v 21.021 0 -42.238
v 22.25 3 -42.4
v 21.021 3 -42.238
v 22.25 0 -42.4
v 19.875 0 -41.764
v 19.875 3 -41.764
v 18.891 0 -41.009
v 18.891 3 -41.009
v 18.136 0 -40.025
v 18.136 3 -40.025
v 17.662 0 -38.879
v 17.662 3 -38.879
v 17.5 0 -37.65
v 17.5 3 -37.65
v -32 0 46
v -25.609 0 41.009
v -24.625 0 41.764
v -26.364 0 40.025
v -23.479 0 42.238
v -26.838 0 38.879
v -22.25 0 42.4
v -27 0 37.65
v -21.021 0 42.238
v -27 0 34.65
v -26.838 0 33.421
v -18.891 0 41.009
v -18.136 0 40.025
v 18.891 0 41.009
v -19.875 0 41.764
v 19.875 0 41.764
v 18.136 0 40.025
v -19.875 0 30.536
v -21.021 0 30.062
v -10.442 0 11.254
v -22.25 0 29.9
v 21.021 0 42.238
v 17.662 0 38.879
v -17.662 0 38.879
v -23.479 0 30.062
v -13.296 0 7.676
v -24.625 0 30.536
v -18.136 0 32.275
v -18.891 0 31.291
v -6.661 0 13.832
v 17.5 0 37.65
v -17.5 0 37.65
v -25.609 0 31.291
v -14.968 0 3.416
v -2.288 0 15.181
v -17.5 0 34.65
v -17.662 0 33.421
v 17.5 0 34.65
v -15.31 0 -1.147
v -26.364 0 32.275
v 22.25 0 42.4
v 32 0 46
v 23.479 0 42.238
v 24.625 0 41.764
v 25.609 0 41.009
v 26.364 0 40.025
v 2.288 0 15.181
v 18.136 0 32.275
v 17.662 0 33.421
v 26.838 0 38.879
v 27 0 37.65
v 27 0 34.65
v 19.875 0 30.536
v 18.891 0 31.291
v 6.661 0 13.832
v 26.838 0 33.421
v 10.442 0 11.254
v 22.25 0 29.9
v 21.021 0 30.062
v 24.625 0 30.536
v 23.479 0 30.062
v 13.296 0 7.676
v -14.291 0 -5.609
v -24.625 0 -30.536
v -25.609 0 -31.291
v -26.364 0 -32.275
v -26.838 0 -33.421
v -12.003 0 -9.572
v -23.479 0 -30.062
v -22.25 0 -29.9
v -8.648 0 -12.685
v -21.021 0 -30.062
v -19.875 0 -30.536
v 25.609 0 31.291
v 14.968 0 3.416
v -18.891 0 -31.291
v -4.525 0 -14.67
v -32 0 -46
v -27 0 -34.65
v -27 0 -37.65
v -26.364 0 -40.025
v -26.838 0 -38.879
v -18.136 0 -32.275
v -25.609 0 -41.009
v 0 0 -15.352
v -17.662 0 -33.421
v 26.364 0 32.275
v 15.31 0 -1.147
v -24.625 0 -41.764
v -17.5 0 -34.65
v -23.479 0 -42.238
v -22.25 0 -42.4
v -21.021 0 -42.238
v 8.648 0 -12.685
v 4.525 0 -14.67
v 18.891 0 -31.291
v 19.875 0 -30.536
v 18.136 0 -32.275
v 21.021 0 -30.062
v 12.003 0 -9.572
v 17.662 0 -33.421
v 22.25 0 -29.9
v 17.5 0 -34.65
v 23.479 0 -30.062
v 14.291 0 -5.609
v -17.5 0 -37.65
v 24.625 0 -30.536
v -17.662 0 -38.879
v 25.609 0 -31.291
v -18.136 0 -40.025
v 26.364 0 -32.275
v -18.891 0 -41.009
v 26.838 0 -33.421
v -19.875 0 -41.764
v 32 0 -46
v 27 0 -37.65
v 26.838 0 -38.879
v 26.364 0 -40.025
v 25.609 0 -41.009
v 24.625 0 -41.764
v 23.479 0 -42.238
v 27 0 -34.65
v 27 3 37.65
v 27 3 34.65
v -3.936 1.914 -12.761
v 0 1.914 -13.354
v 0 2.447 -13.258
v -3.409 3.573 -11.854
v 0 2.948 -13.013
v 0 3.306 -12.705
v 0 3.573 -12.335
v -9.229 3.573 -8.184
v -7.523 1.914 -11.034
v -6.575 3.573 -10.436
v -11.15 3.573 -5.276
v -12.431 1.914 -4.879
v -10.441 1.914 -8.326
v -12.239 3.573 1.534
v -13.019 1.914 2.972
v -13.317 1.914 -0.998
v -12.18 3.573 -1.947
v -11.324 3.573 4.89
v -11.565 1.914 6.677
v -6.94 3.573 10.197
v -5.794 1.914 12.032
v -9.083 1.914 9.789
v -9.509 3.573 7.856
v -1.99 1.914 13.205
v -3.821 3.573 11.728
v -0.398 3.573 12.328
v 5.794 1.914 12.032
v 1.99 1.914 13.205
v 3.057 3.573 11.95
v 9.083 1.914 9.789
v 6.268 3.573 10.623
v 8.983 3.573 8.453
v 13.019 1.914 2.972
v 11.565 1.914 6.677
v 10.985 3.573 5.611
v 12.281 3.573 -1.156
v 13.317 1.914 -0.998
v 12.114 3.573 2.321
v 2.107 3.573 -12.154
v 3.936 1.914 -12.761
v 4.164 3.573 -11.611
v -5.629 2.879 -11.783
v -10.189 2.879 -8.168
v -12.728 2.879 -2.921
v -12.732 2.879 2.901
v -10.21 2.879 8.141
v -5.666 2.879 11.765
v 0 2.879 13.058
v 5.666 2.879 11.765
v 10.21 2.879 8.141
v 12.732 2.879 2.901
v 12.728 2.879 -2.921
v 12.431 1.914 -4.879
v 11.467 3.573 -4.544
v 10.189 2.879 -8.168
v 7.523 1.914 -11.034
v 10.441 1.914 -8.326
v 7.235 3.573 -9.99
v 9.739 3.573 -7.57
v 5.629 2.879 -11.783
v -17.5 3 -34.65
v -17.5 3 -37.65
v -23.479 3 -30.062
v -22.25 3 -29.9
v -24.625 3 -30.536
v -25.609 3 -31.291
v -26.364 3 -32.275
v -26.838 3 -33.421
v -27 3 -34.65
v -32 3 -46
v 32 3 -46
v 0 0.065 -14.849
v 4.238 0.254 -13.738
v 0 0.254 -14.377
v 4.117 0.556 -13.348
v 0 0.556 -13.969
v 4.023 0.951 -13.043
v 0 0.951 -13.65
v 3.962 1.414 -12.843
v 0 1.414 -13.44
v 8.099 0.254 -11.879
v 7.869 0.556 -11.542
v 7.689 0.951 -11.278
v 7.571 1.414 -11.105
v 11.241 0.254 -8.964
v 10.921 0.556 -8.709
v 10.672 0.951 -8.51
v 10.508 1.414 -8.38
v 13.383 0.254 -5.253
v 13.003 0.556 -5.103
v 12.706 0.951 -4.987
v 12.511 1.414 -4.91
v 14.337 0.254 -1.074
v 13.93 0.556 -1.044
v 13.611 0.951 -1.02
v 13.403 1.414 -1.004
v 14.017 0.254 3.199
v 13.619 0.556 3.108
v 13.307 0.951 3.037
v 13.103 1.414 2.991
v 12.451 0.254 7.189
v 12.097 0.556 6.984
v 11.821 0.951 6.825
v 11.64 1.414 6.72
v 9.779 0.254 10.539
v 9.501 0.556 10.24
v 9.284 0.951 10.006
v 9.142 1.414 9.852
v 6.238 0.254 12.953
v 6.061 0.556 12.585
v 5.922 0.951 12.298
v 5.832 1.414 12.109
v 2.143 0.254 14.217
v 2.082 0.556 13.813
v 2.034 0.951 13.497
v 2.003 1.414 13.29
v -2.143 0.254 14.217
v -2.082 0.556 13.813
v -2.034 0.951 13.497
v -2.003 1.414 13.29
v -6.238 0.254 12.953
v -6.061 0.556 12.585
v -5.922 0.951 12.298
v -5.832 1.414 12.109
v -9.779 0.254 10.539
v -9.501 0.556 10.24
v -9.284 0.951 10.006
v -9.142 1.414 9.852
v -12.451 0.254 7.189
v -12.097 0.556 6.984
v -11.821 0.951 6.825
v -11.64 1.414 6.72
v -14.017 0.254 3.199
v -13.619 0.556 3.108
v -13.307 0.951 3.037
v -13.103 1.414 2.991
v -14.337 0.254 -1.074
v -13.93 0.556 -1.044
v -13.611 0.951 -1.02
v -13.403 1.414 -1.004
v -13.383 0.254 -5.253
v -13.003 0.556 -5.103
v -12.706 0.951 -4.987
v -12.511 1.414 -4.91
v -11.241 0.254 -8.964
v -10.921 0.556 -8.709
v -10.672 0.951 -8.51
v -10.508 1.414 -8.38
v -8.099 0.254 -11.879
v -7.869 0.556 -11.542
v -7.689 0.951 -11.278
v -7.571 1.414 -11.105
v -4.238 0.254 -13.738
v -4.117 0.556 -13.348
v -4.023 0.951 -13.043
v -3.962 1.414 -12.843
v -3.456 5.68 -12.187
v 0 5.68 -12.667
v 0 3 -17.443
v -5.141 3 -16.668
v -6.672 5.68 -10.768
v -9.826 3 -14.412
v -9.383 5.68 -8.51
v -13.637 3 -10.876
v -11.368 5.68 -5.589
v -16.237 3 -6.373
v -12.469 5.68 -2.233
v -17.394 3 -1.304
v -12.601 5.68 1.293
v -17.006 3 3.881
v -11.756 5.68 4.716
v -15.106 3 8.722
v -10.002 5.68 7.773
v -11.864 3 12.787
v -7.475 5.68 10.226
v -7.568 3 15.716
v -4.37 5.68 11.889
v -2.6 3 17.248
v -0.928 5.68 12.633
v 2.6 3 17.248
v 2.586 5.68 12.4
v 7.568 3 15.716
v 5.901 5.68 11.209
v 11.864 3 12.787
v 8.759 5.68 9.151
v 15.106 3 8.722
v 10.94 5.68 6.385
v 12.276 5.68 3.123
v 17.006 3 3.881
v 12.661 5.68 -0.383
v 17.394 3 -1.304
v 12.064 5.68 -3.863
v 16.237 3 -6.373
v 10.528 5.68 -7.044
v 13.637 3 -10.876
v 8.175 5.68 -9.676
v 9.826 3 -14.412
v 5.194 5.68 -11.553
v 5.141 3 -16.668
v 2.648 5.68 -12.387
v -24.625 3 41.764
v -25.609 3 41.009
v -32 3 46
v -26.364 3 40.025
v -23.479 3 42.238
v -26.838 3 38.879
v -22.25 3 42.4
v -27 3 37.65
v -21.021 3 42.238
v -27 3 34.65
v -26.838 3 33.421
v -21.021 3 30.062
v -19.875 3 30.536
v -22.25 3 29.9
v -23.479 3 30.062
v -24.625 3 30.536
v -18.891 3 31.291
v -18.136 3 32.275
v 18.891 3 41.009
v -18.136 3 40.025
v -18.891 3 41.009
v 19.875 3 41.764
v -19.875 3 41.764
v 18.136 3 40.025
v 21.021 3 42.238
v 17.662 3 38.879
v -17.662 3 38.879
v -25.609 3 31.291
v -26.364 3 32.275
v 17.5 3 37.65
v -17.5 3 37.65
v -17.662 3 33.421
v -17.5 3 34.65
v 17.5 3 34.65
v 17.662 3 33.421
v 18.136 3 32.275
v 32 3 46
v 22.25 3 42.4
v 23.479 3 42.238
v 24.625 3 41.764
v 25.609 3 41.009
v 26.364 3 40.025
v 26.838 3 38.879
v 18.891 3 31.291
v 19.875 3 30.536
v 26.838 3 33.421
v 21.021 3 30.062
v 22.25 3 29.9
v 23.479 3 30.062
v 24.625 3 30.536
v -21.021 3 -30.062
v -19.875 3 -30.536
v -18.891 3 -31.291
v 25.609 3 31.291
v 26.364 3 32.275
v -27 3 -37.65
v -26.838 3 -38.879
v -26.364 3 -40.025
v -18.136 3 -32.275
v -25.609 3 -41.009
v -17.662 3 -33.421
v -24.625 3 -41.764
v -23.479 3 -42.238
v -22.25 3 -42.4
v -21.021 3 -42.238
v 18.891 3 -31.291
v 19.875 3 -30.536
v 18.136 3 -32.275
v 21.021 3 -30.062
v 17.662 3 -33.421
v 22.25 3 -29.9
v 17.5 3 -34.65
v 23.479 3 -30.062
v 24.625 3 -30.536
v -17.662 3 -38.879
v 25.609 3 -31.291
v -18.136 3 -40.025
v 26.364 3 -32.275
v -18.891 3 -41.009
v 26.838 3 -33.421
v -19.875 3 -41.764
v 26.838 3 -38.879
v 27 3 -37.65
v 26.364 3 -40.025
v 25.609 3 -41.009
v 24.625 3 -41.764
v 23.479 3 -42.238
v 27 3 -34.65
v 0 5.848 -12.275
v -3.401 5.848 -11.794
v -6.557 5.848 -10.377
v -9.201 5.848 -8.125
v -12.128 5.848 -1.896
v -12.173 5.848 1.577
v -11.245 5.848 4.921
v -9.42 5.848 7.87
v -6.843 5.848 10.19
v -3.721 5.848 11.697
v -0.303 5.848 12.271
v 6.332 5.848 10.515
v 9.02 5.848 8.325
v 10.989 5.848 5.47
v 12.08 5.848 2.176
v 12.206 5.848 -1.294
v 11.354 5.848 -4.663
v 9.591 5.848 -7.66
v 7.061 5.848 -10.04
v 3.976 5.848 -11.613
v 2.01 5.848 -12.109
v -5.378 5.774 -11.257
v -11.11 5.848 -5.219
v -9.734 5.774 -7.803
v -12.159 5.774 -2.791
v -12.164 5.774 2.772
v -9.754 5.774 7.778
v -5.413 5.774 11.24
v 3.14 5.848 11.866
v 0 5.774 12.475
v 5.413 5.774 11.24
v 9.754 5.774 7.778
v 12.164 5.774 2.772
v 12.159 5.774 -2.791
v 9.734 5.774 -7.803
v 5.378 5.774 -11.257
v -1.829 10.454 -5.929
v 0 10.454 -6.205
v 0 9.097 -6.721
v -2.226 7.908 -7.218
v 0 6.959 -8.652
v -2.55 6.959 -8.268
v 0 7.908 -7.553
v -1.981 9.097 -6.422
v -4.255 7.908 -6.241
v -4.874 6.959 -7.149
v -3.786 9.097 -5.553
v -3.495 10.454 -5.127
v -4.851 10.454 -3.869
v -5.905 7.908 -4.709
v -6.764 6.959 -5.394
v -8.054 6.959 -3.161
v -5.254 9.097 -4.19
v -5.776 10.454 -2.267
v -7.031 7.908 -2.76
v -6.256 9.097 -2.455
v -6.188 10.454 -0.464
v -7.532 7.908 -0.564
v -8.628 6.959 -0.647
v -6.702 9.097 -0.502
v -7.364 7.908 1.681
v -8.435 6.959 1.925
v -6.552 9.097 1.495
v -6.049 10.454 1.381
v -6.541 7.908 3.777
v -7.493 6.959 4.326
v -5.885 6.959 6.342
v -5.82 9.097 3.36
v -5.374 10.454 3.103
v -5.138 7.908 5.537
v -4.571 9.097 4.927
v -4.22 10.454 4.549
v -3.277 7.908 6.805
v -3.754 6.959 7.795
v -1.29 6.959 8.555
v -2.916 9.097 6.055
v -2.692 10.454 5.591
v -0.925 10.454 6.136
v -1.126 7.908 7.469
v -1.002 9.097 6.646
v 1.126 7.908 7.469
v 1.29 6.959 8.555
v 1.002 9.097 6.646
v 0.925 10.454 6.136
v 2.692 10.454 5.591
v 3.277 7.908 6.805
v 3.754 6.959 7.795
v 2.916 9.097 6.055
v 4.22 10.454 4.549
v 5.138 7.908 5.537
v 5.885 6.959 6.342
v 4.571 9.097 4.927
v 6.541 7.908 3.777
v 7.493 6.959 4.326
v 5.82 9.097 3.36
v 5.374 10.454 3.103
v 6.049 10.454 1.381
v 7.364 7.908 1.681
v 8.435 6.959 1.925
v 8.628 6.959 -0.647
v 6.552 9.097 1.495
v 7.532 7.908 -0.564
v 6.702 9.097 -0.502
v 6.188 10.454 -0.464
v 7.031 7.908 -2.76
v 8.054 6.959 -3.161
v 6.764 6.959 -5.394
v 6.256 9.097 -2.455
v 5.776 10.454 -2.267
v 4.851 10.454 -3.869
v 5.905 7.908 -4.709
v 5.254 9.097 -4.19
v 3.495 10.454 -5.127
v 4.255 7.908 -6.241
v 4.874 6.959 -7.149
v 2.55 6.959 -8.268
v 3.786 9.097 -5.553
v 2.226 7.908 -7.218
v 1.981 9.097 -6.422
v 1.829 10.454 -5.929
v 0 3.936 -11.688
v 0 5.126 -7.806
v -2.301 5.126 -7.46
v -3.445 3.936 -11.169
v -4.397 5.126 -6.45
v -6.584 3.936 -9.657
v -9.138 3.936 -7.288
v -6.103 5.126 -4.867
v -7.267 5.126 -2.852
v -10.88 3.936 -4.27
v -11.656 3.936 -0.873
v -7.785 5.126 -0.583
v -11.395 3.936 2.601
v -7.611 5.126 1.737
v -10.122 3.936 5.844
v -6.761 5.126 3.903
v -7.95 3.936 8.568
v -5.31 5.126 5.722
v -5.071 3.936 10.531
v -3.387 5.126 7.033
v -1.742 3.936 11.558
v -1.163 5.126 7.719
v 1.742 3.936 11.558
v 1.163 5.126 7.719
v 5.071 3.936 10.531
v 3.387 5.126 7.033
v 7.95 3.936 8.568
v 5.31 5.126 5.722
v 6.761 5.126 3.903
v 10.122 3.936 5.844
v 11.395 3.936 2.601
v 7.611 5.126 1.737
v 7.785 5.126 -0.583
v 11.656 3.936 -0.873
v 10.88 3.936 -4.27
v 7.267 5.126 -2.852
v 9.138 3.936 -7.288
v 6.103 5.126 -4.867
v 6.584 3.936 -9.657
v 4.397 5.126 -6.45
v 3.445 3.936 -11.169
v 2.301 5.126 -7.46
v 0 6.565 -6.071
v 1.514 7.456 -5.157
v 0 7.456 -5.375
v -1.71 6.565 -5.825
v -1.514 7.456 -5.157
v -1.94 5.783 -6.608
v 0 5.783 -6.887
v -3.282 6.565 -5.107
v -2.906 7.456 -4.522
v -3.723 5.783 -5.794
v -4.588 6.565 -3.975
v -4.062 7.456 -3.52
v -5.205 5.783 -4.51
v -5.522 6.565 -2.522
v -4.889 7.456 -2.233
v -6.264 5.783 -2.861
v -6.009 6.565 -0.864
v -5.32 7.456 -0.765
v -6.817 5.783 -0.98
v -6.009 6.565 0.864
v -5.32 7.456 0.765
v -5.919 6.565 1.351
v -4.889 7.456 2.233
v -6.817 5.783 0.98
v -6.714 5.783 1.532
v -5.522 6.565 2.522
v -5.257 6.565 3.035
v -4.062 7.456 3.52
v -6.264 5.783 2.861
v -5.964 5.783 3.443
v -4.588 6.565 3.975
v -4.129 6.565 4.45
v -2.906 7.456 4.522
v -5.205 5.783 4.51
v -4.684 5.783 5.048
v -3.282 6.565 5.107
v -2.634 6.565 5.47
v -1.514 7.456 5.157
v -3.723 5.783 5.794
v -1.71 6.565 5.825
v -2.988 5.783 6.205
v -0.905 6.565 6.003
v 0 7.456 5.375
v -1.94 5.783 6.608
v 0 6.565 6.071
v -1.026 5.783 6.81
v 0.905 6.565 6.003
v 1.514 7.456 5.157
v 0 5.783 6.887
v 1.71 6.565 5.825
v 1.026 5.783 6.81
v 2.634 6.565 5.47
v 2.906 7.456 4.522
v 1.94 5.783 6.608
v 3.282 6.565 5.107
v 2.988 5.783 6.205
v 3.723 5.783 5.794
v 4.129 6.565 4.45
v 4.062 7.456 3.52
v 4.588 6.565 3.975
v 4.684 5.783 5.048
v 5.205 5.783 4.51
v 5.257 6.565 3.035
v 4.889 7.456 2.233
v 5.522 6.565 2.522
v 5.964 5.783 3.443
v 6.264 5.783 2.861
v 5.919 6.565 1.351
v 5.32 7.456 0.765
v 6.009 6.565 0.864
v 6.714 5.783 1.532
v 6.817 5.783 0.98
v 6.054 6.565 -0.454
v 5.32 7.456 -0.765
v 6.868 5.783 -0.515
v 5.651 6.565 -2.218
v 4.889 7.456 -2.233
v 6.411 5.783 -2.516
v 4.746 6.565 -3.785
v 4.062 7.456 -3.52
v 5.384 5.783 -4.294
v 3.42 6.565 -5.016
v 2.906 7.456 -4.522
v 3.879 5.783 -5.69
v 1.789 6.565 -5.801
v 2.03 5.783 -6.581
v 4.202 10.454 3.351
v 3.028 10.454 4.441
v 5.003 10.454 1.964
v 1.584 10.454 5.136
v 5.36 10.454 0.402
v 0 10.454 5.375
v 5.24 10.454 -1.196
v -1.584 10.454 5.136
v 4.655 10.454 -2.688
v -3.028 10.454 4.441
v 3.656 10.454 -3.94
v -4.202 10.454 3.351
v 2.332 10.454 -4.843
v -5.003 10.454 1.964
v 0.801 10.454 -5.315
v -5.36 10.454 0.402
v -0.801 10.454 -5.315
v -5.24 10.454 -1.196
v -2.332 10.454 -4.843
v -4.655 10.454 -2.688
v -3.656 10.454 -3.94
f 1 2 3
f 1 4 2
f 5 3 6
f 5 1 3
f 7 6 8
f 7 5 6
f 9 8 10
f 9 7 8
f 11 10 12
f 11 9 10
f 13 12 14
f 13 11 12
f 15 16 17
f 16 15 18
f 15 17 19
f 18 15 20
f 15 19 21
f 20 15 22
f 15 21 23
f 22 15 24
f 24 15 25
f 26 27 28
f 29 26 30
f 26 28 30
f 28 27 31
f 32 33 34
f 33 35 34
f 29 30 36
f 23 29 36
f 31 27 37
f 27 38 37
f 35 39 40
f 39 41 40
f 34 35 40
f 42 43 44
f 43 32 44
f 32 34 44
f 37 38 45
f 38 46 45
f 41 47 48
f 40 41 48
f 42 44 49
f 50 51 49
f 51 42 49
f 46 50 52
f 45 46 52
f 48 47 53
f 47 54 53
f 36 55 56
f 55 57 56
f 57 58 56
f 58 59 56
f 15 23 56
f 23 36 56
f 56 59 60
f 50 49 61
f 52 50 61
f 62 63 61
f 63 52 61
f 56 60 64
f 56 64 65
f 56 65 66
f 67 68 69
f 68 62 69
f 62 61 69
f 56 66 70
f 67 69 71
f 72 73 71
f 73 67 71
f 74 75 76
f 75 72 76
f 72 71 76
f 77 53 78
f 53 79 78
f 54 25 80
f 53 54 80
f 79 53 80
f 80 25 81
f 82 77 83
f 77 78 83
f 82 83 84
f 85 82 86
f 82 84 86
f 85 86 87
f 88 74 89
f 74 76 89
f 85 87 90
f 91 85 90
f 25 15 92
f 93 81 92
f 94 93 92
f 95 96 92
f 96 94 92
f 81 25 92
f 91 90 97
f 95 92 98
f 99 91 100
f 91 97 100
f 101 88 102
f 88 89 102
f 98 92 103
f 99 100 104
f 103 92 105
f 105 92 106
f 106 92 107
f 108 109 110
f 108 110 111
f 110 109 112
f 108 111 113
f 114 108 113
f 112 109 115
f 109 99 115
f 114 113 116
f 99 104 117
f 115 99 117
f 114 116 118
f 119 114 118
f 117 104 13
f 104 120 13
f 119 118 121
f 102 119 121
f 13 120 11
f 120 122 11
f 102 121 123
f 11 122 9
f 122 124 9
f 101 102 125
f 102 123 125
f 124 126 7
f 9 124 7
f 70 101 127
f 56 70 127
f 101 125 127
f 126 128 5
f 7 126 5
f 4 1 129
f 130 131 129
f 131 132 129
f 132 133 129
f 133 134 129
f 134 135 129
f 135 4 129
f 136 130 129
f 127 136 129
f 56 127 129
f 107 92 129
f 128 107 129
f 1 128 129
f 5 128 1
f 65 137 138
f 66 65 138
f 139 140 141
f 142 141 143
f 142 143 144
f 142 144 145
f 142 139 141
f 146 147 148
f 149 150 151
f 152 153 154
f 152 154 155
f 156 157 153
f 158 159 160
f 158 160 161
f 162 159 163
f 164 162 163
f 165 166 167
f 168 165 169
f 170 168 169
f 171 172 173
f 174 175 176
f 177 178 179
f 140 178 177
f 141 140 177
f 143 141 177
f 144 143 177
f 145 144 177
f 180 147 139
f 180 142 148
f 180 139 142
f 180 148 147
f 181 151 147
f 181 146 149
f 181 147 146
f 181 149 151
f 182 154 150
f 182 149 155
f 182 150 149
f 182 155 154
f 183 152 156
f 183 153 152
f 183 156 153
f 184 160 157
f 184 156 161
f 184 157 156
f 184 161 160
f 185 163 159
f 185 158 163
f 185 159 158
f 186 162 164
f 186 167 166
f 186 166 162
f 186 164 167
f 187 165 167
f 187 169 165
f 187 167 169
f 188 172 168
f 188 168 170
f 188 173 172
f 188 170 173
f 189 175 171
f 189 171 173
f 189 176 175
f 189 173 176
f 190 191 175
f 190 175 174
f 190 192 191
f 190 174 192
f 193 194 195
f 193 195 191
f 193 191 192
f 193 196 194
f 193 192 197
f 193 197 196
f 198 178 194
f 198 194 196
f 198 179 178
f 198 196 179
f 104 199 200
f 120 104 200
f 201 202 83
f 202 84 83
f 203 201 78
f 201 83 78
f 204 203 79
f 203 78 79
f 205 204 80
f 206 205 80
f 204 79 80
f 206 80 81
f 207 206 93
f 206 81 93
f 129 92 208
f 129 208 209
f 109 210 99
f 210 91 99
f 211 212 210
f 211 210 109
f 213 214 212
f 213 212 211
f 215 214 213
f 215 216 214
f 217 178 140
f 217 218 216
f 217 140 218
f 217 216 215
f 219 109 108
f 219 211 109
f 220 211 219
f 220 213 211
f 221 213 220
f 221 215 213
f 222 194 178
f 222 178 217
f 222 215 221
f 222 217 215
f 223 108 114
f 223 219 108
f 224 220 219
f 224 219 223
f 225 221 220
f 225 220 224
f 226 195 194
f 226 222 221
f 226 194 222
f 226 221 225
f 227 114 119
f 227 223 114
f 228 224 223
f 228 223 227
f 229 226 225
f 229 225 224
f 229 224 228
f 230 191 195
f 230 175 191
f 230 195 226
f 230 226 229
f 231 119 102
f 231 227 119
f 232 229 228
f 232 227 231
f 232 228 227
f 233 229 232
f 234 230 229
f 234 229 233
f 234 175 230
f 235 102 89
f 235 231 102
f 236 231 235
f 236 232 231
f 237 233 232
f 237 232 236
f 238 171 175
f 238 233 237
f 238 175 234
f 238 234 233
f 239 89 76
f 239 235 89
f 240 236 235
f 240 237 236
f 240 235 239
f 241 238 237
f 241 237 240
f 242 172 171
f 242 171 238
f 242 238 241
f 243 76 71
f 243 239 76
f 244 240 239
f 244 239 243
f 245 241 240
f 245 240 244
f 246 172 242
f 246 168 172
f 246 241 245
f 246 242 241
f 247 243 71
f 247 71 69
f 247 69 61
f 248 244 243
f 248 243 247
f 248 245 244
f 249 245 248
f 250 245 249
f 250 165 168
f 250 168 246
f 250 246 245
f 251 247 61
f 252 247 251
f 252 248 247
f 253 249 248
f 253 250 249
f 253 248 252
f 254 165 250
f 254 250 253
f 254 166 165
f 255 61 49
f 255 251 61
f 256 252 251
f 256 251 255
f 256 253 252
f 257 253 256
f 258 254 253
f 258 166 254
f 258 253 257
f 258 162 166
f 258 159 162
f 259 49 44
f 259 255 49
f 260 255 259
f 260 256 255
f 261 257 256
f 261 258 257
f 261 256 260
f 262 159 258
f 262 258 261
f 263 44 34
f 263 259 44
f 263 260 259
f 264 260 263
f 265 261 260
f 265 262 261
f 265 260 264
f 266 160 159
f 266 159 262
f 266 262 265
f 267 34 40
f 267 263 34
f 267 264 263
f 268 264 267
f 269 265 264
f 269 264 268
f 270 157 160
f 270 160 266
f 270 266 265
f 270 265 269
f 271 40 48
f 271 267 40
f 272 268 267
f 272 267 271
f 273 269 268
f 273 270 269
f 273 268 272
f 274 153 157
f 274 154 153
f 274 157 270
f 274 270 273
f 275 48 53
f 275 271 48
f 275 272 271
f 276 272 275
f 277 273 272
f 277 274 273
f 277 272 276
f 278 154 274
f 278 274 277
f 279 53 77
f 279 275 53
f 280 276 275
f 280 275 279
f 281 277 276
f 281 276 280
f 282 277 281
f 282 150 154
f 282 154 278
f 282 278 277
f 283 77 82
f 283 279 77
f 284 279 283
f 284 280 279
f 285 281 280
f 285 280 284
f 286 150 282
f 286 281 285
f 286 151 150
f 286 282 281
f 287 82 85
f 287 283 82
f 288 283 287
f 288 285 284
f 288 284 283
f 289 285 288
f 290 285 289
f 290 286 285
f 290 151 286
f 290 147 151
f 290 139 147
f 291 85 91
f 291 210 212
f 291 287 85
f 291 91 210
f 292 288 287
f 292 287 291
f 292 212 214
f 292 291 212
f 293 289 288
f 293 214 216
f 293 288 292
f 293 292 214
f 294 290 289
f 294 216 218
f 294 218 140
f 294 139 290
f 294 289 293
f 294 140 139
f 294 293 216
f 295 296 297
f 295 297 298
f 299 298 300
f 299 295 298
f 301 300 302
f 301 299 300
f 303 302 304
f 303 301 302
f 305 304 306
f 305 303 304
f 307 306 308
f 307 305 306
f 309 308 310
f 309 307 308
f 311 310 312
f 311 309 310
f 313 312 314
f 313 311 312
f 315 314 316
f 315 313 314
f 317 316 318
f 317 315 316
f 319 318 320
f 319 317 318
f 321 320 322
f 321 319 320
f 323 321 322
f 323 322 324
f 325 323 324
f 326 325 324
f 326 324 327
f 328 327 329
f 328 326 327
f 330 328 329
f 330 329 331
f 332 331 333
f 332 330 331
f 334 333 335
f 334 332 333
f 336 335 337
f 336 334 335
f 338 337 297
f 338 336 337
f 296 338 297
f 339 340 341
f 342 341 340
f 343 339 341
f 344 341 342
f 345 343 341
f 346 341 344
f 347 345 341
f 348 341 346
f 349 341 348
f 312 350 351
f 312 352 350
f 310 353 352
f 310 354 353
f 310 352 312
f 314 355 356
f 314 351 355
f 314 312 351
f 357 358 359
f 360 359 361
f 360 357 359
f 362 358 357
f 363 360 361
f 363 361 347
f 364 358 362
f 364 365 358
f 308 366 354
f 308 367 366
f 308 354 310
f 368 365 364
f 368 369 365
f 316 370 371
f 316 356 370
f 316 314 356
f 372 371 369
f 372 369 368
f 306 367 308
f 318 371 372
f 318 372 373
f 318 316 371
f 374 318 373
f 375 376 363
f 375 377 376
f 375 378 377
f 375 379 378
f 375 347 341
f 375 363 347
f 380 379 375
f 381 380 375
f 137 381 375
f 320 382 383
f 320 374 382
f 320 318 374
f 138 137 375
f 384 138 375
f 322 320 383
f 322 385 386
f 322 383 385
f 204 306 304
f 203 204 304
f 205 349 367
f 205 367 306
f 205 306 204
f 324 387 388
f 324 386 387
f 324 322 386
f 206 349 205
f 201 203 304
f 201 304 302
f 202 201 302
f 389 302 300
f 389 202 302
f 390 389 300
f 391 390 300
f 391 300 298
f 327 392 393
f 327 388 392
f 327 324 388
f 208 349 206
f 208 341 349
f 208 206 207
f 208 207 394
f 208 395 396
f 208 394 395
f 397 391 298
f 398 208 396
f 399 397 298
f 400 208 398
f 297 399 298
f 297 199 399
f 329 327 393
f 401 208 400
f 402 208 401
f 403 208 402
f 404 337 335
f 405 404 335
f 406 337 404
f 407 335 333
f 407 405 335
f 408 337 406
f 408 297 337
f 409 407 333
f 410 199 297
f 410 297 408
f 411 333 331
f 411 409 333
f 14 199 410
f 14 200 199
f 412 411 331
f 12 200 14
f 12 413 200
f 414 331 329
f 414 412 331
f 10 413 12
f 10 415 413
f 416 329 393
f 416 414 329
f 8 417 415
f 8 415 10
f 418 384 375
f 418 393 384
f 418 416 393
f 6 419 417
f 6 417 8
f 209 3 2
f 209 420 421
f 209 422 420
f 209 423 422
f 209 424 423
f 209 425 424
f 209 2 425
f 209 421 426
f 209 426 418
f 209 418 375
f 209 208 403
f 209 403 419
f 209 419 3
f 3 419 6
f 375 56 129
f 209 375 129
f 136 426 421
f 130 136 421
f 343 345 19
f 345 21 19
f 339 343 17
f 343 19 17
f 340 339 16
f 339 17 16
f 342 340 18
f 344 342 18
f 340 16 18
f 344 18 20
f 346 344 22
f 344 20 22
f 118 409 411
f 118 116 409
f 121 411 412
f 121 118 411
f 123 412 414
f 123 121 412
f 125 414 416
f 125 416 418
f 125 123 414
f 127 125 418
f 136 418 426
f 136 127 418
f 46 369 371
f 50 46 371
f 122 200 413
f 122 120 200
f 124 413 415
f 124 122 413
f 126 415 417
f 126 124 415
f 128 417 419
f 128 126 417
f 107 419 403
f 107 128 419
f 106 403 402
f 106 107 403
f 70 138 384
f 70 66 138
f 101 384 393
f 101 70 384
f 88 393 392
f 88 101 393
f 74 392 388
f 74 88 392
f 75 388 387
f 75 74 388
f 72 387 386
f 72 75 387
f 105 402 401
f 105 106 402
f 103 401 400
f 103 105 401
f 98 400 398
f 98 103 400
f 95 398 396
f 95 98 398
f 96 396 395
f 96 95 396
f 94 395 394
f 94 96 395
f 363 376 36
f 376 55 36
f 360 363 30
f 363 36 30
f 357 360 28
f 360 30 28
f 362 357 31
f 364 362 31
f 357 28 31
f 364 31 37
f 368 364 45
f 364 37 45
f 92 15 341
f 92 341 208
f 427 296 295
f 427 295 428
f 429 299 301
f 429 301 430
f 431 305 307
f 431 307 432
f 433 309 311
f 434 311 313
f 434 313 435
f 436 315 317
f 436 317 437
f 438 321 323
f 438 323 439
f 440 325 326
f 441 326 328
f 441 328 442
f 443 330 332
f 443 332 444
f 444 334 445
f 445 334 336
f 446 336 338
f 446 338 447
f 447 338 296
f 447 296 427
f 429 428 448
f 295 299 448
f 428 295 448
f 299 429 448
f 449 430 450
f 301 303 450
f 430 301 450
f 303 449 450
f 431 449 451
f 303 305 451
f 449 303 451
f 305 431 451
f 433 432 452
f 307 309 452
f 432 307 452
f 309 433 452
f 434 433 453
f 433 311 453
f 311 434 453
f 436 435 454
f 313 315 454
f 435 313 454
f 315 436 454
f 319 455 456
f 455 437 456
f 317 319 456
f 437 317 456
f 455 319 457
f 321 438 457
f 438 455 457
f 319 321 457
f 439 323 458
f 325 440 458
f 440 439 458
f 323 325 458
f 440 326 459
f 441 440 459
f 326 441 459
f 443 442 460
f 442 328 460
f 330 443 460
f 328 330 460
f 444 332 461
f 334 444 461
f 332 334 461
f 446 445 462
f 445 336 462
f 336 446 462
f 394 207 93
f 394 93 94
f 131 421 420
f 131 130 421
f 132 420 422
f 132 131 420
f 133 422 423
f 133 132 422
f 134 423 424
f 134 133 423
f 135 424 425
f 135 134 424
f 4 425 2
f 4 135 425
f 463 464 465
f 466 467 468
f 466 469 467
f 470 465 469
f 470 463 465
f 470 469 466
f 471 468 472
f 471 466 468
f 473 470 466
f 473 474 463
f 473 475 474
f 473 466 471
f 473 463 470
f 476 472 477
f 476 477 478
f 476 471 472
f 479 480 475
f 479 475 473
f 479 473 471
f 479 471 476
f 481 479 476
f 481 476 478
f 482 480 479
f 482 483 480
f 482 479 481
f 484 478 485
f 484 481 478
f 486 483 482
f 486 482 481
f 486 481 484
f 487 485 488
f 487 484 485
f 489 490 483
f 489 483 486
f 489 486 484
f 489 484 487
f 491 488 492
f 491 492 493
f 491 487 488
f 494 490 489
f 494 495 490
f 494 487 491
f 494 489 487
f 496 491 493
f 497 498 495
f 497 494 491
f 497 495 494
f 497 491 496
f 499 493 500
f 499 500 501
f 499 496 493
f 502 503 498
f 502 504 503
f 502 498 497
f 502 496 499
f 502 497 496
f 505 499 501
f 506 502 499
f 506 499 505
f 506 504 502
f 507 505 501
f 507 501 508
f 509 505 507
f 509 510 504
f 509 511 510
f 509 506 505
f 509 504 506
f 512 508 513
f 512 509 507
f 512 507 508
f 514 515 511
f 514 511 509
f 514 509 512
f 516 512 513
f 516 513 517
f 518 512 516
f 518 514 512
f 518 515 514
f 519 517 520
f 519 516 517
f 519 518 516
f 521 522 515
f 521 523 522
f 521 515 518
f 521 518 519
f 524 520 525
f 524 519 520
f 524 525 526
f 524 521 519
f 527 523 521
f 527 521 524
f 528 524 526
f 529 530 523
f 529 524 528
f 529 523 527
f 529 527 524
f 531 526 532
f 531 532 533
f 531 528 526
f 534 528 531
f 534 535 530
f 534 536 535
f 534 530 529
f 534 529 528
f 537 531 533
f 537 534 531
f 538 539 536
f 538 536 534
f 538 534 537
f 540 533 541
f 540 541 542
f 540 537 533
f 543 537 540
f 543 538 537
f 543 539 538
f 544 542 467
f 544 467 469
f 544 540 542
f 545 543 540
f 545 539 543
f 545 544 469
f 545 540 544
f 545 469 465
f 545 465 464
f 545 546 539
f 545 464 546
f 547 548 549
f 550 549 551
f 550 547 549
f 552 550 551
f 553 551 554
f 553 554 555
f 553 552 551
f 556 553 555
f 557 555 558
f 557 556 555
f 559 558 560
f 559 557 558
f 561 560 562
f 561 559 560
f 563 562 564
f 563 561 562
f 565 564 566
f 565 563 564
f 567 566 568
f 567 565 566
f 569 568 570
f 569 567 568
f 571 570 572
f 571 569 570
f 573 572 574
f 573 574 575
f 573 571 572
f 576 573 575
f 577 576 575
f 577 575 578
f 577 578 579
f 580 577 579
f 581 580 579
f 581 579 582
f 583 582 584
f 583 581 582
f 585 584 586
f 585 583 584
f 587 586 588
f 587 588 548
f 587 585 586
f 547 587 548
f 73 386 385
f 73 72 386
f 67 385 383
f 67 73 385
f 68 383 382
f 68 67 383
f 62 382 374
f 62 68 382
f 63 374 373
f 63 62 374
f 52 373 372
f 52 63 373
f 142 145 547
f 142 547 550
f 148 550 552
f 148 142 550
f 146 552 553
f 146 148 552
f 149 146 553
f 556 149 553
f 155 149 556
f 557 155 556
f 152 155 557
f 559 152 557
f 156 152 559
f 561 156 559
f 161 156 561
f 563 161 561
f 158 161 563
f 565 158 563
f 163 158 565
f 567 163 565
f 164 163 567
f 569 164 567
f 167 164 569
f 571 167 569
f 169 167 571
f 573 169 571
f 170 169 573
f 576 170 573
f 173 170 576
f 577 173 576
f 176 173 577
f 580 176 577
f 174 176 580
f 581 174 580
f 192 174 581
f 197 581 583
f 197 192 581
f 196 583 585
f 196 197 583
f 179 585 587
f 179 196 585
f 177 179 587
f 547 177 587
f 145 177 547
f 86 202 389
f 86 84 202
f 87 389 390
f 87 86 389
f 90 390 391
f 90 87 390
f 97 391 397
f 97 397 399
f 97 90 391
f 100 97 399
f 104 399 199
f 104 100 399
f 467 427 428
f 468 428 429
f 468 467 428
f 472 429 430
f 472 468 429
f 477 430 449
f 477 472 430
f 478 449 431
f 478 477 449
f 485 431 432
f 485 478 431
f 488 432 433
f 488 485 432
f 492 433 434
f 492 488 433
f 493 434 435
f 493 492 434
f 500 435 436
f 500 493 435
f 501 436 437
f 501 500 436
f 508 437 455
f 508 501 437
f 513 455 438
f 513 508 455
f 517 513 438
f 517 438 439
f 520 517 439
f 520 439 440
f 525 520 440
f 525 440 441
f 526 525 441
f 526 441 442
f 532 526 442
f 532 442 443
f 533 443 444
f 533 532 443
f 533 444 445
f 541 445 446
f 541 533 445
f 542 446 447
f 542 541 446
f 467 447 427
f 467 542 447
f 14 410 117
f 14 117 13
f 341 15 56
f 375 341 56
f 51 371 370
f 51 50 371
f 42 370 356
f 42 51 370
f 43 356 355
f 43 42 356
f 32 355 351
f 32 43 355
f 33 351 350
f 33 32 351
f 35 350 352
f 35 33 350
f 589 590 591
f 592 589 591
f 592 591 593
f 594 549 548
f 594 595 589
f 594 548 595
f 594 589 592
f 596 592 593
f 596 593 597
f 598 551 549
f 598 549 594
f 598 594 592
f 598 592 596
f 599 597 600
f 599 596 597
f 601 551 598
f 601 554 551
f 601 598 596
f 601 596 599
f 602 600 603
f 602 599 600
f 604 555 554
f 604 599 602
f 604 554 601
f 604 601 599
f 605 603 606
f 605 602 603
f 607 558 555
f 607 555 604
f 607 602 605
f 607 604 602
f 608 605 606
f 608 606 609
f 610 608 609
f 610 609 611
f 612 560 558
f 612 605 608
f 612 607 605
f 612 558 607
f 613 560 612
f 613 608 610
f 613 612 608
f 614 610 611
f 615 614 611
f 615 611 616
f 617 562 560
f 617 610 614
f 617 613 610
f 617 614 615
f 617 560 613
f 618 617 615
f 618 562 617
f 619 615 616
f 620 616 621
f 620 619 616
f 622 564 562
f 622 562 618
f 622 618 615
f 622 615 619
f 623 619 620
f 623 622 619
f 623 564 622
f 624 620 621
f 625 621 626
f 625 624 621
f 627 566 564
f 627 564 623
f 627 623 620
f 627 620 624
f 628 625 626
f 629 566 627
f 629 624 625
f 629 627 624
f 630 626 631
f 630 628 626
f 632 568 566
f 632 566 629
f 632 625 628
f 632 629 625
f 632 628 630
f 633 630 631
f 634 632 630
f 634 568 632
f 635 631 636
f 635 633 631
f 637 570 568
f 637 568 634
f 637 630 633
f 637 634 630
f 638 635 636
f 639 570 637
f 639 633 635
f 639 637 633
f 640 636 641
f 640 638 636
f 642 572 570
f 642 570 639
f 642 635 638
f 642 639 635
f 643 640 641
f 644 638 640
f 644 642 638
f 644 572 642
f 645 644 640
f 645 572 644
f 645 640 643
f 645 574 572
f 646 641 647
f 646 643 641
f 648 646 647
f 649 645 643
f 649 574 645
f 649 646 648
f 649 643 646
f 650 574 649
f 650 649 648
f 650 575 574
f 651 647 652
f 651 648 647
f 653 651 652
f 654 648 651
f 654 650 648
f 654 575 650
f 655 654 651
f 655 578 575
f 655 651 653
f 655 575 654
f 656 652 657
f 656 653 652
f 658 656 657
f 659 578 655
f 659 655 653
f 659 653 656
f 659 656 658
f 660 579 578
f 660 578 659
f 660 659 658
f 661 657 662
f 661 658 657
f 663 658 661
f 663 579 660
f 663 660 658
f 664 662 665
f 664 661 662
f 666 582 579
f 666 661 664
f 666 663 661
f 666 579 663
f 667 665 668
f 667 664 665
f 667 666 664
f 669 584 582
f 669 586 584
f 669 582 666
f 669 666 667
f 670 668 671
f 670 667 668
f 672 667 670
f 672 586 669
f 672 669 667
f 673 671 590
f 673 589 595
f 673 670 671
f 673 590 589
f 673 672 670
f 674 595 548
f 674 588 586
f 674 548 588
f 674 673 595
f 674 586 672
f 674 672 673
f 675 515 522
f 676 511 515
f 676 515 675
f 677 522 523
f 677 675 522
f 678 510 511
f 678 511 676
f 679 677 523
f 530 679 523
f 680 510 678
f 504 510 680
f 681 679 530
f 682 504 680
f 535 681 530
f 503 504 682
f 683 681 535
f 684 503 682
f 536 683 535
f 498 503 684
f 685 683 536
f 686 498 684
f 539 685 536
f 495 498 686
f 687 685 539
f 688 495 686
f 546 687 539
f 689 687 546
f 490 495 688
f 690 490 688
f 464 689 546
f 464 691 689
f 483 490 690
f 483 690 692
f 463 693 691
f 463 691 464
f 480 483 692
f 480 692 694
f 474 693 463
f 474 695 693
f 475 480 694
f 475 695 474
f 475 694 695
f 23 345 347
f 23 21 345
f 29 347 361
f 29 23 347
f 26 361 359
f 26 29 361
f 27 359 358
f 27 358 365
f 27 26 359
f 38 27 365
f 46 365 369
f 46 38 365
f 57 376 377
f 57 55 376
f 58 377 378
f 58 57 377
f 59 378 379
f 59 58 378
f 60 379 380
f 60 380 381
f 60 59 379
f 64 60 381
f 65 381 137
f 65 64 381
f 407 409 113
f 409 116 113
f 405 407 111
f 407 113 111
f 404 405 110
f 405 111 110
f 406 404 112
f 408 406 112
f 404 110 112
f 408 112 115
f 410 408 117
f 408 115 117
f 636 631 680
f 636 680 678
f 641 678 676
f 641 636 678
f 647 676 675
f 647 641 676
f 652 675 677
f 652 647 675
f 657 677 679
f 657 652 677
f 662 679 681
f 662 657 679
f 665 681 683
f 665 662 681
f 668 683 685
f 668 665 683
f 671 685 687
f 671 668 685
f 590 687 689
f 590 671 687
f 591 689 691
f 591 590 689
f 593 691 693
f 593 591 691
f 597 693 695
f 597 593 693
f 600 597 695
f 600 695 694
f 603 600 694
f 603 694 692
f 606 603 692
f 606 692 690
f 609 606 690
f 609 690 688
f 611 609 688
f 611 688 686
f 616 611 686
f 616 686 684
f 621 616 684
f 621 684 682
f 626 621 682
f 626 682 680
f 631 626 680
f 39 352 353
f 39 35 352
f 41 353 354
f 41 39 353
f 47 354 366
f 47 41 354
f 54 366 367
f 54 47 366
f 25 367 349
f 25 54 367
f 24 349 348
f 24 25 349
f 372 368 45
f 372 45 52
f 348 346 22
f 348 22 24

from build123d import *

# Parameters (mm, degrees)
SKETCH1_W           = 64
SKETCH1_H           = 92
BOSS_EXTRUDE1_DEPTH = 3
SKETCH2_W           = 9.5
SKETCH2_H           = 12.5
CUT_EXTRUDE1_DEPTH  = 3
FILLET1_R           = 4.75
FILLET2_R           = 2
CUT_EXTRUDE2_START  = -10.454
SKETCH6_R           = 5.375
CUT_EXTRUDE2_DEPTH  = 10.454
SKETCH8_R           = 13.356098795
CUT_EXTRUDE3_DEPTH  = 3
FILLET3_R           = 2
FILLET4_R           = 2


# Some blends are built 0.0001 mm under size
with BuildPart() as part:
    # Sketch1 → Boss-Extrude1 (new body)
    with BuildSketch(Plane(origin=(0, 0, 0), x_dir=(1, 0, 0), z_dir=(0, 1, 0))):
        Rectangle(SKETCH1_W, SKETCH1_H)
    extrude(amount=BOSS_EXTRUDE1_DEPTH)

    # Sketch2 → Cut-Extrude1 (cut)
    with BuildSketch(Plane(origin=(0, 3, 0), x_dir=(1, 0, 0), z_dir=(0, 1, 0))):
        with Locations((22.25, 36.15)):
            Rectangle(SKETCH2_W, SKETCH2_H)
        with Locations((-22.25, 36.15)):
            Rectangle(SKETCH2_W, SKETCH2_H)
        with Locations((22.25, -36.15)):
            Rectangle(SKETCH2_W, SKETCH2_H)
        with Locations((-22.25, -36.15)):
            Rectangle(SKETCH2_W, SKETCH2_H)
    extrude(amount=-CUT_EXTRUDE1_DEPTH, mode=Mode.SUBTRACT)

    # Fillet1
    fillet1_edges = [part.edges().sort_by_distance(p)[0] for p in [
        (27, 1.5, 42.4),
        (17.5, 1.5, 42.4),
        (17.5, 1.5, 29.9),
        (27, 1.5, 29.9),
        (-27, 1.5, 42.4),
        (-17.5, 1.5, 42.4),
        (-17.5, 1.5, 29.9),
        (-27, 1.5, 29.9),
        (27, 1.5, -29.9),
        (17.5, 1.5, -29.9),
        (27, 1.5, -42.4),
        (17.5, 1.5, -42.4),
        (-17.5, 1.5, -29.9),
        (-27, 1.5, -29.9),
        (-17.5, 1.5, -42.4),
        (-27, 1.5, -42.4),
    ]]
    fillet(fillet1_edges, radius=FILLET1_R - 0.0001)  # a hair under: the kernel refuses the full size

    # Sketch5 → Revolve1 (revolve)
    with BuildSketch(Plane(origin=(0, 0, 0), x_dir=(0, 0, -1), z_dir=(1, 0, 0))):
        with BuildLine():
            Line((17.443, 3), (12.48, 5.785))
            Line((12.48, 5.785), (8.652, 6.959))
            ThreePointArc((8.652, 6.959), (7.100088069, 8.476564665), (6.205, 10.454))
            Line((6.205, 10.454), (0, 10.454))
            Line((0, 10.454), (0, 3))
            Line((0, 3), (2, 3))
            Line((2, 3), (2, 8.454))
            Line((2, 8.454), (4.805757283, 8.454))
            ThreePointArc((4.805757283, 8.454), (6.064441281, 6.572314424), (7.806379809, 5.126397352))
            Line((7.806379809, 5.126397352), (11.688413221, 3.935825977))
            Line((11.688413221, 3.935825977), (13.356098795, 3))
            Line((13.356098795, 3), (17.443, 3))
        make_face()
    revolve(axis=Axis((0, -11.842752106, 0), (0, 1, 0)))

    # Fillet2
    fillet2_edges = [part.edges().sort_by_distance(p)[0] for p in [
        (0, 5.785, 12.48),
    ]]
    fillet(fillet2_edges, radius=FILLET2_R)

    # Sketch6 → Cut-Extrude2 (cut)
    with BuildSketch(Plane(origin=(0, 10.454, 0), x_dir=(1, 0, 0), z_dir=(0, 1, 0)).offset(CUT_EXTRUDE2_START)):
        with Locations(Location((0, 0, 0), (0, 0, 270))):
            Circle(SKETCH6_R)
    extrude(amount=CUT_EXTRUDE2_DEPTH, mode=Mode.SUBTRACT)

    # Sketch8 → Cut-Extrude3 (cut)
    with BuildSketch(Plane(origin=(0, 0, 0), x_dir=(-1, 0, 0), z_dir=(0, -1, 0))):
        with Locations(Location((0, 0, 0), (0, 0, 90))):
            Circle(SKETCH8_R)
    extrude(amount=-CUT_EXTRUDE3_DEPTH, mode=Mode.SUBTRACT)

    # Fillet3
    fillet3_edges = [part.edges().sort_by_distance(p)[0] for p in [
        (0, 3, 13.356098795),
    ]]
    fillet(fillet3_edges, radius=FILLET3_R)

    # Fillet4
    # the kernel refuses this fillet: 2 mm, written as the material it takes off along each edge
    with BuildSketch(Plane(origin=(0, 0, 0), x_dir=(0, 0, -1), z_dir=(-1, 0, 0))) as fillet4_piece_1:
        with BuildLine():
            CenterArc((15.352435599, -2), FILLET4_R, 90, 87.54885706)
            Line((15.352435599, 0), (15.352435599, 0.2))
            Line((15.352435599, 0.2), (13.356098795, 0.2))
            Line((13.356098795, 0.2), (13.156098795, 0))
            ThreePointArc((13.156098795, 0), (13.156095386, -1.828930112), (13.154448481, -1.905911573))
            Line((13.154448481, -1.905911573), (13.354265492, -1.914465067))
        make_face()
    revolve(axis=Axis((0, 0, 0), (0, -1, 0)), mode=Mode.SUBTRACT)


solid = part.part
